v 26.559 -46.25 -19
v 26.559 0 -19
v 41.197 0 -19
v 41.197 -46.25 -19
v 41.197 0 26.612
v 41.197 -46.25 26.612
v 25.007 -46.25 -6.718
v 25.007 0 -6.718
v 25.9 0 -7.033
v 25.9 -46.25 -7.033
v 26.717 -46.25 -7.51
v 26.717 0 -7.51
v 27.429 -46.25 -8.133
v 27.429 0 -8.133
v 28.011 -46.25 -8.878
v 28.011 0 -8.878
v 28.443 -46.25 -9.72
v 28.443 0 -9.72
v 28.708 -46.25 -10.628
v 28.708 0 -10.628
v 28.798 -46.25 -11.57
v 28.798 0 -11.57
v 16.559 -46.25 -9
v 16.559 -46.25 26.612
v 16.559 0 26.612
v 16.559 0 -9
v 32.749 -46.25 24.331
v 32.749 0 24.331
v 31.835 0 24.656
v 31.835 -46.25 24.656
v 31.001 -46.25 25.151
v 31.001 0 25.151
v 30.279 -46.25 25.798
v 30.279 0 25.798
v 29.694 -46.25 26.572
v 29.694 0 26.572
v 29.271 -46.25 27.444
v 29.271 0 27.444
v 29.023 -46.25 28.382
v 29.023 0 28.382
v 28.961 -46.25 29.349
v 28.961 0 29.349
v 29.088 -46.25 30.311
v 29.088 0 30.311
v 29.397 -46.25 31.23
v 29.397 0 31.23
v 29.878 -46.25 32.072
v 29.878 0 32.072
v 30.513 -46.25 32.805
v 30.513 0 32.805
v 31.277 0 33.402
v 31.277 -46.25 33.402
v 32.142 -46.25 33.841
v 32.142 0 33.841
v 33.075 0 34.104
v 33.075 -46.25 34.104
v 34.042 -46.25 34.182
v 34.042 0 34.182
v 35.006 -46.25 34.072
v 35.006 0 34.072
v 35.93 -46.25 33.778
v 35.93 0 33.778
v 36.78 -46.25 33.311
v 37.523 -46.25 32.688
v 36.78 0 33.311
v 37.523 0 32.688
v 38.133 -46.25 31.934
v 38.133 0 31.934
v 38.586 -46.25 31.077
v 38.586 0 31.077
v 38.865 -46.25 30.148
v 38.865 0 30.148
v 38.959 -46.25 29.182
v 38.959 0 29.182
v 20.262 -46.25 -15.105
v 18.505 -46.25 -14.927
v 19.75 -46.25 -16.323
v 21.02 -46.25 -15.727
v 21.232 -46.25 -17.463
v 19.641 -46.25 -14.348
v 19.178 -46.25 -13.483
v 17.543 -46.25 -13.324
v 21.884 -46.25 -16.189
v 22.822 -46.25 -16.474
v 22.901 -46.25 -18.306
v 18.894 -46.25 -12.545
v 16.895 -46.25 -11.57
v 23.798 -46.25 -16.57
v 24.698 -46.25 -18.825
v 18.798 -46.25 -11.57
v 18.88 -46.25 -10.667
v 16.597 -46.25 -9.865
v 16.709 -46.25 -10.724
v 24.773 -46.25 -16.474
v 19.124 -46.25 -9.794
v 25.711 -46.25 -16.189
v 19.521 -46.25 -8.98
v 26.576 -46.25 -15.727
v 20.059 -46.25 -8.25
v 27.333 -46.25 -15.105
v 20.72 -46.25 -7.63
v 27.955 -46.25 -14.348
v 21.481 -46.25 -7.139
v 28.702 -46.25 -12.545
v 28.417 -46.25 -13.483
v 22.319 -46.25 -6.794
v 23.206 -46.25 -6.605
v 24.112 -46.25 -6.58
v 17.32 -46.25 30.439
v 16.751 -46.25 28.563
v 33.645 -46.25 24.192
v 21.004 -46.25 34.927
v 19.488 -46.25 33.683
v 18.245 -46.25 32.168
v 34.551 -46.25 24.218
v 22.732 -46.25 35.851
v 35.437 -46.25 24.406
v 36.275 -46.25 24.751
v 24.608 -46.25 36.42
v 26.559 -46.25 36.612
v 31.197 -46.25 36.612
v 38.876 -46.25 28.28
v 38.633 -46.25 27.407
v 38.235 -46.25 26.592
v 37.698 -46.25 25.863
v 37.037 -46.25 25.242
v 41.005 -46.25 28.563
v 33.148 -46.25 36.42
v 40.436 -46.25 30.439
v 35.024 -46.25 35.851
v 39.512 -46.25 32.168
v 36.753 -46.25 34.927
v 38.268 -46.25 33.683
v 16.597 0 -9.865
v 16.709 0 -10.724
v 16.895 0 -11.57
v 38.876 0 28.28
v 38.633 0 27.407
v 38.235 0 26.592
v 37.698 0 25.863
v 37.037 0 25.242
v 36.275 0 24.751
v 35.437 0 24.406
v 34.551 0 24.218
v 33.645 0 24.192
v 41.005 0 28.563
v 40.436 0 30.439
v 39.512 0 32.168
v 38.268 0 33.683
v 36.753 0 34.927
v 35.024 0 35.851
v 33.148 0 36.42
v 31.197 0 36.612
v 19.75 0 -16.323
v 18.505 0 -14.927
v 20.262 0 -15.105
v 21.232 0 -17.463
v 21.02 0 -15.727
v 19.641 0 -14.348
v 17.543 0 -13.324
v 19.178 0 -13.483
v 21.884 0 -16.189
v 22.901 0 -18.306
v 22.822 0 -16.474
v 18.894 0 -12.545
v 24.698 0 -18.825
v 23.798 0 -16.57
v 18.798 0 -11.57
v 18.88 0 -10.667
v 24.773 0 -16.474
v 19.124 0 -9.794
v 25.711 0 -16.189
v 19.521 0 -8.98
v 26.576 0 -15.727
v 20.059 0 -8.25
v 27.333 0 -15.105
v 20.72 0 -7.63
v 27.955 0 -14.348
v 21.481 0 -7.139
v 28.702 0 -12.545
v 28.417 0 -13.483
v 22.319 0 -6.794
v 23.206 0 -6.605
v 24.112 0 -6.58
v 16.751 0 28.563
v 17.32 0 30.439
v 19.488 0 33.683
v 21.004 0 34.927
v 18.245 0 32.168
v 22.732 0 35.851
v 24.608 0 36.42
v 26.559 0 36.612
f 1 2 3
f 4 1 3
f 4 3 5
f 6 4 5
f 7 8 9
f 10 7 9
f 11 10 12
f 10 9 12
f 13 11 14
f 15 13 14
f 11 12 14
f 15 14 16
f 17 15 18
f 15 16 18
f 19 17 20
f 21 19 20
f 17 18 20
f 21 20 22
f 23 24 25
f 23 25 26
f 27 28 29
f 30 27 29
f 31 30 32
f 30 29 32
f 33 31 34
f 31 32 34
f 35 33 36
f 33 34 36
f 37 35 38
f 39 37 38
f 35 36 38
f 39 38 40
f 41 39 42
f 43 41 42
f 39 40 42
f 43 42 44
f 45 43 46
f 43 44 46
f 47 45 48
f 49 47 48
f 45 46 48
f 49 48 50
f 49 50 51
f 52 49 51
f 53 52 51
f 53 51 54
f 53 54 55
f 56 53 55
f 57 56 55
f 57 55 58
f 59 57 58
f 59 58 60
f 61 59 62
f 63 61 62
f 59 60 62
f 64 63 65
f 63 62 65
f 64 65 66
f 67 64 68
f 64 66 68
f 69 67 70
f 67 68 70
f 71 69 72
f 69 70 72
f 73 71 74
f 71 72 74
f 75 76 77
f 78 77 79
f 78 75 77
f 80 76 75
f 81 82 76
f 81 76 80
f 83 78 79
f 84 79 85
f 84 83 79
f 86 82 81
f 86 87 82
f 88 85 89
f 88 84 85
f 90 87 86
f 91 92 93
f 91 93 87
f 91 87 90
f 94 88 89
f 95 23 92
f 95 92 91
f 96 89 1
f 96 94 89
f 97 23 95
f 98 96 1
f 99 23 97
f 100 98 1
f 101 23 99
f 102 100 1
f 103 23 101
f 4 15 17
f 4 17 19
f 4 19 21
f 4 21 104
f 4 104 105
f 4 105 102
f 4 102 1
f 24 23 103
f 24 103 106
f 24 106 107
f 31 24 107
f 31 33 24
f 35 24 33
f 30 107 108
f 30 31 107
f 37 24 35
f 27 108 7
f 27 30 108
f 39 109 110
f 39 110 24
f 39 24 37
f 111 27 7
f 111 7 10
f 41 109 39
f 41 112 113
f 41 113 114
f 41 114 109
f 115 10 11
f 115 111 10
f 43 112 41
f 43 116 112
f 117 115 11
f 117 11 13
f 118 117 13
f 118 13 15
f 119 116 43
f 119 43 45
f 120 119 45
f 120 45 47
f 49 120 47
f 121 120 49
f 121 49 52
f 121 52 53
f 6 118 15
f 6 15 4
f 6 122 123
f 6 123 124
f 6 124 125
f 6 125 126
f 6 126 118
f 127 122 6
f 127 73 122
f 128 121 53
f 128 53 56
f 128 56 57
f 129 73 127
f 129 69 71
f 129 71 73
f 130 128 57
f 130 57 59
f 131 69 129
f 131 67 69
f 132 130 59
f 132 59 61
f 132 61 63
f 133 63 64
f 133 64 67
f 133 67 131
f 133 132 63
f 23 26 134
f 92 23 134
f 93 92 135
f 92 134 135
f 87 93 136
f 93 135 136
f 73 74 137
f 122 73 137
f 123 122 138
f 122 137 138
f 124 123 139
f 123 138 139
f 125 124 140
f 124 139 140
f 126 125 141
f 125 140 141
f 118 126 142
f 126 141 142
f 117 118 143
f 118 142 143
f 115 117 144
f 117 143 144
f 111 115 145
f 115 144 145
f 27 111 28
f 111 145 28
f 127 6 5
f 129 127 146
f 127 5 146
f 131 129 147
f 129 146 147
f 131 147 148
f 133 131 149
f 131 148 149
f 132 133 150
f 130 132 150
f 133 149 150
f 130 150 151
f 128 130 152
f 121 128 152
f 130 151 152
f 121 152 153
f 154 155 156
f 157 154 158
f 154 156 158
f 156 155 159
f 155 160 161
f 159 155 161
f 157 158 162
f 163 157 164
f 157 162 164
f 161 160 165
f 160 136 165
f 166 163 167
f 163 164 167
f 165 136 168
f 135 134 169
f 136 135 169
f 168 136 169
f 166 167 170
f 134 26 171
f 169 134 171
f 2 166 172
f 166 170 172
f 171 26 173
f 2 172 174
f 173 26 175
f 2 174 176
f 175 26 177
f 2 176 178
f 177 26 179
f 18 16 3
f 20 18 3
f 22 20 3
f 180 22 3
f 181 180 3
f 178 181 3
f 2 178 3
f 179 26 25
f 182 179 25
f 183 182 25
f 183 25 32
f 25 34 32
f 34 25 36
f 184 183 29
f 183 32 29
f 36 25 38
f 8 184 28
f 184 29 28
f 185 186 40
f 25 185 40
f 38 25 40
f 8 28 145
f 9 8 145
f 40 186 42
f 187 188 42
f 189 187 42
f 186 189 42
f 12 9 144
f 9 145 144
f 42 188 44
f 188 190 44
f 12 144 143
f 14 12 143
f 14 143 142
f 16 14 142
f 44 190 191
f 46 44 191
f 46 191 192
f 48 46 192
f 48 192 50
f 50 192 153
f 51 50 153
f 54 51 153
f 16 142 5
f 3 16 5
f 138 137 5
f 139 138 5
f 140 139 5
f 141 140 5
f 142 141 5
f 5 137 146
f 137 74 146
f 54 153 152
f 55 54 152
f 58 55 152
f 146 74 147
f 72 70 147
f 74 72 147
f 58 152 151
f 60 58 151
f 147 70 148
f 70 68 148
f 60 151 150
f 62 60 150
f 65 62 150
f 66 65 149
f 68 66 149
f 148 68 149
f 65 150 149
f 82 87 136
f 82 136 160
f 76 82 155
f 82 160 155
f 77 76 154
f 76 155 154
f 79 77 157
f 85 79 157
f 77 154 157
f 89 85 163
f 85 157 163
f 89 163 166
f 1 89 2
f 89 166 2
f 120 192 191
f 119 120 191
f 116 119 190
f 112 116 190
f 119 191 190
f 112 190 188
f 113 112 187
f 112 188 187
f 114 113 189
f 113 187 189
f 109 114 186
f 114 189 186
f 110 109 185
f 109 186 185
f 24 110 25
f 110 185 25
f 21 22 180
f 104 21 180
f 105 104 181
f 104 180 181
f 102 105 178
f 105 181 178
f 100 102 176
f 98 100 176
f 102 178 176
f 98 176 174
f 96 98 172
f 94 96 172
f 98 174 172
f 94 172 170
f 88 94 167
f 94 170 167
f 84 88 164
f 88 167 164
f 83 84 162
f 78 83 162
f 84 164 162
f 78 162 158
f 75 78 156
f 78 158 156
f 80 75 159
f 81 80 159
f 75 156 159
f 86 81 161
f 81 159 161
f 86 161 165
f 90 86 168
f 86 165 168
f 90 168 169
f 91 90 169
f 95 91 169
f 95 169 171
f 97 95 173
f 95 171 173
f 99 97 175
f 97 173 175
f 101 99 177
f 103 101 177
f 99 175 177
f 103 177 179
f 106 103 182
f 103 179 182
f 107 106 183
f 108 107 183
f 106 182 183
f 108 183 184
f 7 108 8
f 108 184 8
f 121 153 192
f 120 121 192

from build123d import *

# Parameters (mm, degrees)
F1_DEPTH = 46.25


with BuildPart() as f1:
    # F0 (on Front) → F1 (new body)
    with BuildSketch(Plane.XZ):
        with BuildLine():
            ThreePointArc((38.958571, 29.182484), (30.880263, 33.122538), (32.748961, 24.331006))
            ThreePointArc((32.748961, 24.331006), (37.036878, 25.242431), (38.958571, 29.182484))
        make_face()
        with BuildLine():
            ThreePointArc((16.559277, -8.999688), (16.643621, -10.295744), (16.895229, -11.569936))
            ThreePointArc((16.895229, -11.569936), (20.464299, -16.927566), (26.559277, -18.999688))
            Line((26.559277, -18.999688), (41.197145, -18.999688))
            Line((41.197145, -18.999688), (41.197145, 6.000312))
            Line((41.197145, 6.000312), (41.197145, 13.000312))
            Line((41.197145, 13.000312), (41.197145, 26.612237))
            ThreePointArc((41.197145, 26.612237), (38.268212, 33.683304), (31.197145, 36.612237))
            Line((31.197145, 36.612237), (26.559277, 36.612237))
            ThreePointArc((26.559277, 36.612237), (19.488209, 33.683304), (16.559277, 26.612237))
            Line((16.559277, 26.612237), (16.559277, -8.999688))
        make_face()
        with BuildLine():
            ThreePointArc((28.797851, -11.569936), (23.797851, -16.569936), (18.797851, -11.569936))
            ThreePointArc((18.797851, -11.569936), (20.719544, -7.629882), (25.00746, -6.718458))
            ThreePointArc((25.00746, -6.718458), (27.737905, -8.491629), (28.797851, -11.569936))
        make_face(mode=Mode.SUBTRACT)
        with BuildLine():
            ThreePointArc((38.958571, 29.182484), (37.036878, 25.242431), (32.748961, 24.331006))
            ThreePointArc((32.748961, 24.331006), (30.880263, 33.122538), (38.958571, 29.182484))
        make_face(mode=Mode.SUBTRACT)
    extrude(amount=F1_DEPTH)


solid = f1.part
